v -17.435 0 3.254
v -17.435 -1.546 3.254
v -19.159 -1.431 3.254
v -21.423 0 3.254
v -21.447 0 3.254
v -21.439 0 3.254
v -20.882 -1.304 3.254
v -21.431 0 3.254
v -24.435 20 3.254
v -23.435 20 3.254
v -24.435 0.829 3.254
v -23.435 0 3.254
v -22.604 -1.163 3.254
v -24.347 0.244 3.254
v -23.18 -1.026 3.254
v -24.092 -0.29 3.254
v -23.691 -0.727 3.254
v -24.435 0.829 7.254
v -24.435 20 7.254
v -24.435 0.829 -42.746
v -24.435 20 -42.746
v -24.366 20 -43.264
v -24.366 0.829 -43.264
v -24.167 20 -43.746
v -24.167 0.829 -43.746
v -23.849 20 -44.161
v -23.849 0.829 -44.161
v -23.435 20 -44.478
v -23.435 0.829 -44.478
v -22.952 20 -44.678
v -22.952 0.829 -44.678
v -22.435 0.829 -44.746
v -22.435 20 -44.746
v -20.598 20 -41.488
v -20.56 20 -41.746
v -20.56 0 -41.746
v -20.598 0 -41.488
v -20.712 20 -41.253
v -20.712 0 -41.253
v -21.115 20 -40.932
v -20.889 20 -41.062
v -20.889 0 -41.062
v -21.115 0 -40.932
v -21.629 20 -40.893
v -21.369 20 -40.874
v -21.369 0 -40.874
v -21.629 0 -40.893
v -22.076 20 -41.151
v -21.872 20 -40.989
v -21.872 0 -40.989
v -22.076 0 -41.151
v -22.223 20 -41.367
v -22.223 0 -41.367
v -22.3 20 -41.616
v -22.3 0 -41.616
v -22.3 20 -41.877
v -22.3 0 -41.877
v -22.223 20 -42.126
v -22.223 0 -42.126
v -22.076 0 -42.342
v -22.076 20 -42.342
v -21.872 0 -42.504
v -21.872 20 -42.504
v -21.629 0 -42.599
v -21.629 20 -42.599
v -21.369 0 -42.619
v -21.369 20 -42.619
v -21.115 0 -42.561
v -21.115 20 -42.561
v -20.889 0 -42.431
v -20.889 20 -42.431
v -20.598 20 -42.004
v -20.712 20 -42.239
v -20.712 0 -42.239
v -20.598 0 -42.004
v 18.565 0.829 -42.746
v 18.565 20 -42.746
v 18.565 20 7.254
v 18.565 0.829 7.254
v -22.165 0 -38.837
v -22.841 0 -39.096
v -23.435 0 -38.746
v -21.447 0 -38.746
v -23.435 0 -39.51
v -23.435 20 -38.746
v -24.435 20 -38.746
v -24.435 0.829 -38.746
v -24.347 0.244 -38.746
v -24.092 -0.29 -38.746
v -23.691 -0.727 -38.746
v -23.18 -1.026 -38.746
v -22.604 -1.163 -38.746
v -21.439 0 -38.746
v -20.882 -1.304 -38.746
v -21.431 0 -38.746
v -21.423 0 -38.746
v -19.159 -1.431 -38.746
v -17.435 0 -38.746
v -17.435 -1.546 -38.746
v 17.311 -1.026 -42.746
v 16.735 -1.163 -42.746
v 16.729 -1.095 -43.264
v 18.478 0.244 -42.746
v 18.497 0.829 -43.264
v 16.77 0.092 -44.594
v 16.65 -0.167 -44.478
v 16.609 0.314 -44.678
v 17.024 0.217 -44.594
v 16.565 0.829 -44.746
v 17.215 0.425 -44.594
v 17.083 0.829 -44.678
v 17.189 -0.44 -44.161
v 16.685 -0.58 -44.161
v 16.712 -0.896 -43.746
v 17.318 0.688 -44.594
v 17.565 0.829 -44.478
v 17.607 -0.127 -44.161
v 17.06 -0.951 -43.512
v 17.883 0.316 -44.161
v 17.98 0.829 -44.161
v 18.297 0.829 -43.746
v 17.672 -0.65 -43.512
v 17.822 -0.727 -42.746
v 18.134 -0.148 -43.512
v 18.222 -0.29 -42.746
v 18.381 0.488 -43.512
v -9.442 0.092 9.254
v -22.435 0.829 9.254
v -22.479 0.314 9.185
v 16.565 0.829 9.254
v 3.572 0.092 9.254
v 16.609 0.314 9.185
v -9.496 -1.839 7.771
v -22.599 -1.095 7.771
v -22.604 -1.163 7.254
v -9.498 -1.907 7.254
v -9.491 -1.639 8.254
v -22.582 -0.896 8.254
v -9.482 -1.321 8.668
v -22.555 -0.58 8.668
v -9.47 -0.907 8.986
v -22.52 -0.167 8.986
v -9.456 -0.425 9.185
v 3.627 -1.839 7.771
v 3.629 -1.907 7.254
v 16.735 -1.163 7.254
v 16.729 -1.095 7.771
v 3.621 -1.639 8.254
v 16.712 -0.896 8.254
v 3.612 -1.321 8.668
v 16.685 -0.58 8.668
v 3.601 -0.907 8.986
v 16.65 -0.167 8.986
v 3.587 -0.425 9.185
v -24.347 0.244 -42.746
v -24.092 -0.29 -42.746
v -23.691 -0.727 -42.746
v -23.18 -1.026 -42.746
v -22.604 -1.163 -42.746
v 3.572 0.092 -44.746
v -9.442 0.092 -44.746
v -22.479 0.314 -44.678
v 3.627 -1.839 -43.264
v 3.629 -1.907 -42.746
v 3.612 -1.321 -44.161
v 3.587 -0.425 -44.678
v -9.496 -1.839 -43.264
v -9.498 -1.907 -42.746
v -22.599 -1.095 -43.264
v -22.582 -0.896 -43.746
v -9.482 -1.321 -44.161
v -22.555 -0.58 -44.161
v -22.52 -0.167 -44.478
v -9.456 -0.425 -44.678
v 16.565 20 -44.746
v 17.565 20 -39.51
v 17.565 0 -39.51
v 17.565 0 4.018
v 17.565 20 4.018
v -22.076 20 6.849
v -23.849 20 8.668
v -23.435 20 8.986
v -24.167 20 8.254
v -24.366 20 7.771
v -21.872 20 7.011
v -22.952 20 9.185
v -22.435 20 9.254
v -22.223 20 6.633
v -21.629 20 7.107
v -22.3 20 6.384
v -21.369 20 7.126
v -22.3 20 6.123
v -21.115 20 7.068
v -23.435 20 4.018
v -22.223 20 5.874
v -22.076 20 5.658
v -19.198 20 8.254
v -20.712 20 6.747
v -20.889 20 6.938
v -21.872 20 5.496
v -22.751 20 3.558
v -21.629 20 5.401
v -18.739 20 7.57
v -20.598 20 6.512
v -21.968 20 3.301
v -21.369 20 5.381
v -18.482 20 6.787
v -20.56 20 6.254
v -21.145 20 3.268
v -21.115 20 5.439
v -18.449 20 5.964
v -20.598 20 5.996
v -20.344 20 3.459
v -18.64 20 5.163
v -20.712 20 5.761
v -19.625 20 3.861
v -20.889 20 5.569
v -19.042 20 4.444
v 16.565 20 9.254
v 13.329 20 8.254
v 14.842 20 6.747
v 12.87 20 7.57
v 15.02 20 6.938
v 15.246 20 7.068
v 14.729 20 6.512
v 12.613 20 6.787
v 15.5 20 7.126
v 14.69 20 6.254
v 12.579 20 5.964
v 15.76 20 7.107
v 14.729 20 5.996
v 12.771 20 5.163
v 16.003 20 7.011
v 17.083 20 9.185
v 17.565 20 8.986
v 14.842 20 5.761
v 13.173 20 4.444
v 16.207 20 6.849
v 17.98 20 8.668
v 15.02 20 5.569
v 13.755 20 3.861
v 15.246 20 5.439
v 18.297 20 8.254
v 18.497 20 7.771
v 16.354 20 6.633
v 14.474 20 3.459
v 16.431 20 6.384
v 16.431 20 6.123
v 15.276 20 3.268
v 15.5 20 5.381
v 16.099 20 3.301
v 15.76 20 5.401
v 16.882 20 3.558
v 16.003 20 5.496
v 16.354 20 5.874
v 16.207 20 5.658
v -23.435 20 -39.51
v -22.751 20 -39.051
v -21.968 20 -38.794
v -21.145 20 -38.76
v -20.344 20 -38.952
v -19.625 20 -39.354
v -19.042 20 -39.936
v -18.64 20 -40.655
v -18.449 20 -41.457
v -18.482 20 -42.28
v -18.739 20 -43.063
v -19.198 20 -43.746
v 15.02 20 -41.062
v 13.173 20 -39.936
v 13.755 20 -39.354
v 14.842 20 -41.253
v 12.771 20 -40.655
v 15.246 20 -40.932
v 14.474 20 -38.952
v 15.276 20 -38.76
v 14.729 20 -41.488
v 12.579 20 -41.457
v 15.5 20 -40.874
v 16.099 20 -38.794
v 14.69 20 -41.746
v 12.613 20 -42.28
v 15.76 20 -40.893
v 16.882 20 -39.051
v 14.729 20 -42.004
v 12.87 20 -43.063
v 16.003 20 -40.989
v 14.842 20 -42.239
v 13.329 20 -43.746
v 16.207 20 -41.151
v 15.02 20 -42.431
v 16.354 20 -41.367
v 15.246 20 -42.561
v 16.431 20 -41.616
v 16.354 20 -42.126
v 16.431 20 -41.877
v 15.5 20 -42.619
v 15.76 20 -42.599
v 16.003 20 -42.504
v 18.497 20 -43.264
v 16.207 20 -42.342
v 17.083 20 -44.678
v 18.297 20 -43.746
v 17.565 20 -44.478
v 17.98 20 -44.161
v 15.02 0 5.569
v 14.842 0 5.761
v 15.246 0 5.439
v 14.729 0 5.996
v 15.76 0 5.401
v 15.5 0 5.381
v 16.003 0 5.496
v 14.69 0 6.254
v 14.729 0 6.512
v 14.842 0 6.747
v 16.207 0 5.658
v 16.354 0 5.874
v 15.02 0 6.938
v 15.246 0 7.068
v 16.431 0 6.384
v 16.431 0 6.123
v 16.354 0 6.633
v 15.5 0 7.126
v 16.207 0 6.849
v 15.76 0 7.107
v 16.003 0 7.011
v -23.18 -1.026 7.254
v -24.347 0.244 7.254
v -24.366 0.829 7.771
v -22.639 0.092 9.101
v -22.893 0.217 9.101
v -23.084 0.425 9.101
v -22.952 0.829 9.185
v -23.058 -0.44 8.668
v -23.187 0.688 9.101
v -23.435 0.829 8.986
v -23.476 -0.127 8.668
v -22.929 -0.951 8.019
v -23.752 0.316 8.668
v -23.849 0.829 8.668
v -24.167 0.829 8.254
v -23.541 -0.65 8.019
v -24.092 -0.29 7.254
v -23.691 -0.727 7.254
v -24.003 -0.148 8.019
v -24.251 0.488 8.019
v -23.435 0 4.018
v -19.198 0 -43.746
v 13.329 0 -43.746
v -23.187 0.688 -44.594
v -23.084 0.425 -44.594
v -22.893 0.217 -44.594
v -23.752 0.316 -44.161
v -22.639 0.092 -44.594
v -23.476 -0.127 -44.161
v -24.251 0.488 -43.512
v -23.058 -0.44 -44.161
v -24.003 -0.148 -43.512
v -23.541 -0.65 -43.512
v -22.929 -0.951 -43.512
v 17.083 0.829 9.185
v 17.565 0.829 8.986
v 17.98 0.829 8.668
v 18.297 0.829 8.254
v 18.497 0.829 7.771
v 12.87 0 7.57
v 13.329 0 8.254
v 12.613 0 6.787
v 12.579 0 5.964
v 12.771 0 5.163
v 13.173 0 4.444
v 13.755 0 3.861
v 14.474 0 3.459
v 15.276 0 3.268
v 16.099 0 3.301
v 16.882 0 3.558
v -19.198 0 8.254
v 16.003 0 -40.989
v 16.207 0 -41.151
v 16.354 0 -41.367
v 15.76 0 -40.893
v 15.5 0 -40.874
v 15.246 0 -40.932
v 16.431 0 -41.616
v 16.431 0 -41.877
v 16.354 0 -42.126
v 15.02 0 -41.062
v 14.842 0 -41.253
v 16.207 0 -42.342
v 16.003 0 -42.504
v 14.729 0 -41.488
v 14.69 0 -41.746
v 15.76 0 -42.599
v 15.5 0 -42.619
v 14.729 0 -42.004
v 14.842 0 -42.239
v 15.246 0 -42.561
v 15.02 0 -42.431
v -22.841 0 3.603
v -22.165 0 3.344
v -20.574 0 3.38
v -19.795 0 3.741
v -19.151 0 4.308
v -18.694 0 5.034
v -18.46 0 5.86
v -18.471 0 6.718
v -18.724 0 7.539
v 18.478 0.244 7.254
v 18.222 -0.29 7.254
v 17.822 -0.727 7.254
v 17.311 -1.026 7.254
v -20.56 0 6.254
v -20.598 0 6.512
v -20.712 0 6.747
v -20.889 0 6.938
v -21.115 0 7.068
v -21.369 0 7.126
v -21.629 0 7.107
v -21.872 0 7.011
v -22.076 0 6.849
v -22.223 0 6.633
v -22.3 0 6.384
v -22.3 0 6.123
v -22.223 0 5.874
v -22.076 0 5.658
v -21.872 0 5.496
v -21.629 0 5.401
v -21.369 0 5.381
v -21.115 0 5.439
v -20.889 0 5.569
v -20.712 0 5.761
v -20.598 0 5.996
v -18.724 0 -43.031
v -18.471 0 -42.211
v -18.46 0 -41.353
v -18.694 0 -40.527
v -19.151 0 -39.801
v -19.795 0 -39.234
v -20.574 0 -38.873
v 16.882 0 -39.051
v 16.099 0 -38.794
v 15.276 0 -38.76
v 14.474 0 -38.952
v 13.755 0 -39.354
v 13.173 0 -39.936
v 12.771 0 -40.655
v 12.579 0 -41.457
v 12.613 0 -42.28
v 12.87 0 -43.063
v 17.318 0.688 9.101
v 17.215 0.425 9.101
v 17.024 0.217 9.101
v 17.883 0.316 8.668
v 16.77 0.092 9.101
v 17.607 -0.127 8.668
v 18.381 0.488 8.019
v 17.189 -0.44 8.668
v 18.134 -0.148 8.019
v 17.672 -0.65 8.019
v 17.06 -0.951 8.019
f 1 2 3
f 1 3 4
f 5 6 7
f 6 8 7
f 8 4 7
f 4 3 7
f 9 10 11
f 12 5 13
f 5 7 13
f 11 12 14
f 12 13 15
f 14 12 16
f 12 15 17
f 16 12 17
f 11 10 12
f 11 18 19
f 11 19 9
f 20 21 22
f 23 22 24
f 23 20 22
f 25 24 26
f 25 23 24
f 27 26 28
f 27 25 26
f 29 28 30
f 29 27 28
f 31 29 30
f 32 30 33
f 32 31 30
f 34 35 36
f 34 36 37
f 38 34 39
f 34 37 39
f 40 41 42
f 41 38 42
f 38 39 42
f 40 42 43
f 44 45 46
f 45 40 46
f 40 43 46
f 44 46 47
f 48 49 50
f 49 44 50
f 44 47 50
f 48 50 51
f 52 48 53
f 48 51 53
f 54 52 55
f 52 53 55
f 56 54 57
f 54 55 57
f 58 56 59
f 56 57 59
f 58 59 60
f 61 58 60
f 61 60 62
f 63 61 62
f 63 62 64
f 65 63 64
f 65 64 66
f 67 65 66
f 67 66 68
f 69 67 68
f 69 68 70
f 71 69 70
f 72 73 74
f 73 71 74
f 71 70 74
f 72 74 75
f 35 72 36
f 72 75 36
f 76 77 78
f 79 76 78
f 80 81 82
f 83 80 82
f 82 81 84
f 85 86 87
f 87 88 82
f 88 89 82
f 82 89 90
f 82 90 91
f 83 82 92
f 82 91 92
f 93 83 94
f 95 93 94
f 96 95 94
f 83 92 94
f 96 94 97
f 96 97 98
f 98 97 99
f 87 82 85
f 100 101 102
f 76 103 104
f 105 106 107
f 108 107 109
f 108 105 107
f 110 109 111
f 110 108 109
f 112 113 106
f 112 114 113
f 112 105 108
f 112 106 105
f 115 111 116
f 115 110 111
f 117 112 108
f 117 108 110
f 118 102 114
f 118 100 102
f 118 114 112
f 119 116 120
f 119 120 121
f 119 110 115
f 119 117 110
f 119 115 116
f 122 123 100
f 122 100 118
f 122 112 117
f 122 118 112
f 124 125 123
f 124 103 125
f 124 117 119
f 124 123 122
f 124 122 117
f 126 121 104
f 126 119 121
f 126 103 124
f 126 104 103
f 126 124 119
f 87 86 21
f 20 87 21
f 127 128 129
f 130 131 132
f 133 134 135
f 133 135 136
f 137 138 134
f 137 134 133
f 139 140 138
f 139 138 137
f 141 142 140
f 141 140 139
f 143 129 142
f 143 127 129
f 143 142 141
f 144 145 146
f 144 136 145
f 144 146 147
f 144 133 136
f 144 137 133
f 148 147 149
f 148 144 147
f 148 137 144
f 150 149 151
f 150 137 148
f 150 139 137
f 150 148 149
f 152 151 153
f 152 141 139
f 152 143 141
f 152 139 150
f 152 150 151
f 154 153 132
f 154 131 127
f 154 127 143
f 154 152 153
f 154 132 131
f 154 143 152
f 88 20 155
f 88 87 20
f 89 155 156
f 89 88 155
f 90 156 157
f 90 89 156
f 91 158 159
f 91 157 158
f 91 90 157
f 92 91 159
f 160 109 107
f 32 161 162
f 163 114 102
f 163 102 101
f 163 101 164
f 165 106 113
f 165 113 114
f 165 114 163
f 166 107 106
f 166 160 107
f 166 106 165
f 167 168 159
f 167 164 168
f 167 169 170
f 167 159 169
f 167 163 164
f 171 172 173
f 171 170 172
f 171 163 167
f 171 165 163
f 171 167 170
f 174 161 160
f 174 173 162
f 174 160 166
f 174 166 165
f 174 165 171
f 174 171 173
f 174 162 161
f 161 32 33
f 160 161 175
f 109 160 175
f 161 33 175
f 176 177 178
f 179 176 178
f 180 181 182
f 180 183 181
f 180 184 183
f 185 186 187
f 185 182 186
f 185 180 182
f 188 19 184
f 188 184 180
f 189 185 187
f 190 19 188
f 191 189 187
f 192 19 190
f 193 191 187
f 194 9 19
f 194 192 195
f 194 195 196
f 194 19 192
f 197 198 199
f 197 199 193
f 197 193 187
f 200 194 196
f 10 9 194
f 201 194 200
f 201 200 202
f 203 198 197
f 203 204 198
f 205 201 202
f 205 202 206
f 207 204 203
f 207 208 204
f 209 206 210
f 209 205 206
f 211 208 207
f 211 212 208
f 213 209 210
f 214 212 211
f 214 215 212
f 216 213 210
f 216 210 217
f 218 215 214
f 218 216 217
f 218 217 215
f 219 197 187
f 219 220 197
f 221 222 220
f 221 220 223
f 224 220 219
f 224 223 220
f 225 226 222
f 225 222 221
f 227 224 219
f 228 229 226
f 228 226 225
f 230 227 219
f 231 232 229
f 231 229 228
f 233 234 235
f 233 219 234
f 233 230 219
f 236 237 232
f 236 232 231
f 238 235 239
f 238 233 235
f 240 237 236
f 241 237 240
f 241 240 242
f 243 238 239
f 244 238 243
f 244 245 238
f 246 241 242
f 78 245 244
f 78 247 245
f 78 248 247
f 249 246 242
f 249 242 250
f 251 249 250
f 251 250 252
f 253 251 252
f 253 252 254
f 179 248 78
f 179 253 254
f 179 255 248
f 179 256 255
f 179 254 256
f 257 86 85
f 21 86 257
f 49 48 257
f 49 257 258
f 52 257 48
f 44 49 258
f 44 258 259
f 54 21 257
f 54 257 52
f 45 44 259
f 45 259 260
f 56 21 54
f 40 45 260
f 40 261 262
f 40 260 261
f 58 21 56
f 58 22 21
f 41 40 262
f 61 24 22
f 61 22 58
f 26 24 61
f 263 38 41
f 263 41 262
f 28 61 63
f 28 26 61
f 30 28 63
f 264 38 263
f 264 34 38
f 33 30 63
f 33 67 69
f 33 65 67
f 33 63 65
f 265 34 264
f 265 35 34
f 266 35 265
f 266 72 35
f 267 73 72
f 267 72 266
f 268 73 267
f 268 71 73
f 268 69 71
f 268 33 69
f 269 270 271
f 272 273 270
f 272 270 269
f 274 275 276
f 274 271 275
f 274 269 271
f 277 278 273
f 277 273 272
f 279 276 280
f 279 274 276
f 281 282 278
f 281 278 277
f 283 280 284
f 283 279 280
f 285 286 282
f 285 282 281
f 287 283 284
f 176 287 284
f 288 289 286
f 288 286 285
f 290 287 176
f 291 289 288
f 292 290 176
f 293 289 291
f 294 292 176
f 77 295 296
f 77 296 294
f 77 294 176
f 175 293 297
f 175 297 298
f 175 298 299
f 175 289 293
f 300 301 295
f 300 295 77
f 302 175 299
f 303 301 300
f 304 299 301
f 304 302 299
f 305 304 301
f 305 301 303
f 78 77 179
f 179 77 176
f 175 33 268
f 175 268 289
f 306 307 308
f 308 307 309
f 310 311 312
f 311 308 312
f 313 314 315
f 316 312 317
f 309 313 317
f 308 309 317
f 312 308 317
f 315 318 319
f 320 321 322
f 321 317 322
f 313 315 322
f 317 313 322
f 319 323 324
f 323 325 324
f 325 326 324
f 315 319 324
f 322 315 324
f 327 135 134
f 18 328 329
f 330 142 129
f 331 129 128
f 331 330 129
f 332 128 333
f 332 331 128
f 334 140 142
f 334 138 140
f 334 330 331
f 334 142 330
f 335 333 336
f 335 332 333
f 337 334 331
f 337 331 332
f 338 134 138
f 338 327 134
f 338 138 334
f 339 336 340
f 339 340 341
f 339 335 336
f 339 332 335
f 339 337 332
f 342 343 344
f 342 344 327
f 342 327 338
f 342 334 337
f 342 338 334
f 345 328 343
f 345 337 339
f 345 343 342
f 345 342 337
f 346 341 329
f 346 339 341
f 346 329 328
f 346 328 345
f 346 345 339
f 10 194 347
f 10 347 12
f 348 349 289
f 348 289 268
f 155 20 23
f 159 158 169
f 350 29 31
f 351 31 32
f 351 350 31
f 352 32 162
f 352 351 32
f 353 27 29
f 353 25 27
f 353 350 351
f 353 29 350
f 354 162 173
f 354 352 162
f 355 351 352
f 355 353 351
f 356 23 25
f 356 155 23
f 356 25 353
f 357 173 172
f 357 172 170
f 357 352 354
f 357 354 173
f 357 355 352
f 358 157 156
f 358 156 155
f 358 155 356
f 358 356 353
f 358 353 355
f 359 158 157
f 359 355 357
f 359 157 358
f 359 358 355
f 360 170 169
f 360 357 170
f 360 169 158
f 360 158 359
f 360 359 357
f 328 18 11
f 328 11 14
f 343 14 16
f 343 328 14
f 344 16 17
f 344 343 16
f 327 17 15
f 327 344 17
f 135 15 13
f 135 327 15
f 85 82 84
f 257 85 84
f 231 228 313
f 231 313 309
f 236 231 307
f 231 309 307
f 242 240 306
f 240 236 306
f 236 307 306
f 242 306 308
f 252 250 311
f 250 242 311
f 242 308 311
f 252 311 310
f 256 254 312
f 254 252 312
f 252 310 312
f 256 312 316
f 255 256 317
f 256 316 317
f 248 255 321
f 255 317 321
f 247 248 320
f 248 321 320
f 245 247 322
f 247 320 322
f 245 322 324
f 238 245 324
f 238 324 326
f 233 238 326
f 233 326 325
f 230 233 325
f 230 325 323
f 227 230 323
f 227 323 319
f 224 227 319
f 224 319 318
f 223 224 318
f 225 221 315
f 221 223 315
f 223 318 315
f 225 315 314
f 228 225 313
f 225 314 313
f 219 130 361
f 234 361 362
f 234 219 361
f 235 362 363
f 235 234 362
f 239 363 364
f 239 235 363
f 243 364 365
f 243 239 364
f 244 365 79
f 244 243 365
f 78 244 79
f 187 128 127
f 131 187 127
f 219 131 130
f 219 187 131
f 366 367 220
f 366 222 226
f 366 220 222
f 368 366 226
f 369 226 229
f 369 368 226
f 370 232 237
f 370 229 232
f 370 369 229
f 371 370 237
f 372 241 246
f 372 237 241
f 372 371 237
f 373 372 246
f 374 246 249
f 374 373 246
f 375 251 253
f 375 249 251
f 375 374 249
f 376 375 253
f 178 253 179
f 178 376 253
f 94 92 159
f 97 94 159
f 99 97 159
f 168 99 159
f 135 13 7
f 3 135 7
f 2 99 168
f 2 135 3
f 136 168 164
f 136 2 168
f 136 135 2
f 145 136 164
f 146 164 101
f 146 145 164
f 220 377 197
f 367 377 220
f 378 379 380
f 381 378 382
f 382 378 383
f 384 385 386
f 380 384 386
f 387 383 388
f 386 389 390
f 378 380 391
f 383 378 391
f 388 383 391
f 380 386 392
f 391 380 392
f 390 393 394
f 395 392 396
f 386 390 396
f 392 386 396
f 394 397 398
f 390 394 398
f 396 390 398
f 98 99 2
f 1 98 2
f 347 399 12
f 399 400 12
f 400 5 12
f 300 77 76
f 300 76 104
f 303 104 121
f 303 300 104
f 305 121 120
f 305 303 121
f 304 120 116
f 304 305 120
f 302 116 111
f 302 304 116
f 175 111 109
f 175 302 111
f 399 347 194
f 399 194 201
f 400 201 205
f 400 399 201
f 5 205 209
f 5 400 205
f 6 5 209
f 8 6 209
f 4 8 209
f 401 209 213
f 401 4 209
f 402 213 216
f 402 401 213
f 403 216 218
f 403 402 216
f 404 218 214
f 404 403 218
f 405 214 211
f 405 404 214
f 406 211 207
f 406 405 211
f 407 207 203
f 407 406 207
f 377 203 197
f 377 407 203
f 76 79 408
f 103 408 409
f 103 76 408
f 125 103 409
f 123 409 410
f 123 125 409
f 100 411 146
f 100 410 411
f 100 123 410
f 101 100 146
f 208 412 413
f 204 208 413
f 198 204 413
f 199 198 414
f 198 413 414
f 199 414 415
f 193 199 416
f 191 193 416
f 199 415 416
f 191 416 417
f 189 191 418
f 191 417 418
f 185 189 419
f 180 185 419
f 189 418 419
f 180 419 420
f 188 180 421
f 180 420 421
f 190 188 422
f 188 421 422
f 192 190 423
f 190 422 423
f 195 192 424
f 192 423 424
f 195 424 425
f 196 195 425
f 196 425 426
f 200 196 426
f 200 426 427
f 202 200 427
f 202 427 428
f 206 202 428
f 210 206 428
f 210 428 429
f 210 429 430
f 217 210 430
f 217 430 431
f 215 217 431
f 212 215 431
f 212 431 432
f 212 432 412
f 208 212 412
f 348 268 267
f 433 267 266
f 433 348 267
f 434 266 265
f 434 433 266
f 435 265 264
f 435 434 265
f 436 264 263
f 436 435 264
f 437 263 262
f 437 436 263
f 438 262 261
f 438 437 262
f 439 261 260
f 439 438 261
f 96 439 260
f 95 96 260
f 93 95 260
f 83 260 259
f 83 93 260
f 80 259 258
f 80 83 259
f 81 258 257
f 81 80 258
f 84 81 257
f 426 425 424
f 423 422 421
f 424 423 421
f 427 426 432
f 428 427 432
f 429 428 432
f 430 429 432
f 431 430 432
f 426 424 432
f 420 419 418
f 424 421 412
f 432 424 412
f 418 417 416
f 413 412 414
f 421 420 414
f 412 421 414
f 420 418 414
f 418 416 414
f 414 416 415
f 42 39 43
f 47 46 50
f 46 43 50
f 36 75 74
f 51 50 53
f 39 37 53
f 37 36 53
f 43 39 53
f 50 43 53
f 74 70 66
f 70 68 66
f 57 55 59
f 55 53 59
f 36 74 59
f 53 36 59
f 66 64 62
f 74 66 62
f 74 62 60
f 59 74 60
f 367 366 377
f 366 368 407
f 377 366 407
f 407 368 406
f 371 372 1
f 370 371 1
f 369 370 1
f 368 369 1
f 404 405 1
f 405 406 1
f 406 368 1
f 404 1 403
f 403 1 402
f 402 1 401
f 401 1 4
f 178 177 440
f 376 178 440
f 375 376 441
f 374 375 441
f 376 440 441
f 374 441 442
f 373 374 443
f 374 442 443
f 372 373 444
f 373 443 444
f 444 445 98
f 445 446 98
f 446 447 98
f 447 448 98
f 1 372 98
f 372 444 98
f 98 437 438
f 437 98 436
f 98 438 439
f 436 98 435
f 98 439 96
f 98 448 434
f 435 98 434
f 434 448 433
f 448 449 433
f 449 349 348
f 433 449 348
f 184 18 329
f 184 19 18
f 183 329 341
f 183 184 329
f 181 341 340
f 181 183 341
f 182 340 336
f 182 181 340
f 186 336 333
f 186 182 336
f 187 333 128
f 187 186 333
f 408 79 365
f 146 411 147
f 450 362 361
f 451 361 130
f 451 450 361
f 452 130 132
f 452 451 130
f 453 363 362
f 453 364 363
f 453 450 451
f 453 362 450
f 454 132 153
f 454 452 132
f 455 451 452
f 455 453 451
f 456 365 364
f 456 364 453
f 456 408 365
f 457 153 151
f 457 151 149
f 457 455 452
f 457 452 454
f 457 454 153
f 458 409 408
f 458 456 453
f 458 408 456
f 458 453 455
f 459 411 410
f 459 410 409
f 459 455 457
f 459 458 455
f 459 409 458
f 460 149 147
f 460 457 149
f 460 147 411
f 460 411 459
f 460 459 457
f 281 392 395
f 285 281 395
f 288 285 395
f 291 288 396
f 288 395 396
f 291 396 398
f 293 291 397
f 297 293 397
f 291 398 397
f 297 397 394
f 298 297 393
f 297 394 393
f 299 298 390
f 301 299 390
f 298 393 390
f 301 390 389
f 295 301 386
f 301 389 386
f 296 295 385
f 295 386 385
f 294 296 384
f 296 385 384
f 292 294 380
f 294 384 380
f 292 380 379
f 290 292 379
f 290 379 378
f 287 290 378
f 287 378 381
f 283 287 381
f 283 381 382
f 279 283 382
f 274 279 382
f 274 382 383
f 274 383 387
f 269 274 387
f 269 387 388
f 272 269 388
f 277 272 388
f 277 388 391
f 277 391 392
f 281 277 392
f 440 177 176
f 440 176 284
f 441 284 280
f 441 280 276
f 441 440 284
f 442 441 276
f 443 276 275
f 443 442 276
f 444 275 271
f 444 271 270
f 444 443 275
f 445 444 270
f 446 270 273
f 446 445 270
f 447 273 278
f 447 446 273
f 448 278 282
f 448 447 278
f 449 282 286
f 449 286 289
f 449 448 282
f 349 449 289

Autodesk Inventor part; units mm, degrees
ref_plane "YZ Plane" through (0, 0, 0) normal (1, 0, 0) x (0, 1, 0)
ref_plane "XZ Plane" through (0, 0, 0) normal (0, 1, 0) x (-1, 0, 0)
ref_plane "XY Plane" through (0, 0, 0) normal (0, 0, 1) x (1, 0, 0)
sketch "Sketch1" plane through (0, 0, 0) normal (0, 1, 0) x (-1, 0, 0)
  line L0 (-18.5654, 9.2536) -> (2.9346, 9.2536)
  line L1 (2.9346, 9.2536) -> (2.9346, -17.7464)
  line L2 (2.9346, -17.7464) -> (-18.5654, -17.7464)
  line L3 (-18.5654, -17.7464) -> (-18.5654, 9.2536)
  circle A0 centre (-15.5654, 6.2536) radius 0.875
  line L4 (-17.5654, 3.454) -> (-17.5654, -16.6136)
  line L5 (2.9346, 8.2536) -> (-13.3293, 8.2536)
  line L6 (-17.5654, 3.454) -> (-17.5654, 4.0175)
  line L7 (-17.5654, -16.6136) -> (-17.5654, -17.7464)
  arc A1 (-17.5654, 4.0175) -> (-13.3293, 8.2536) centre (-15.5654, 6.2536) ccw
  point P0 (0, 0)
  dimension "d0" = 21.5
  dimension "d2" = 27
  dimension "d3" = 3
  dimension "d4" = 3
  dimension "d6" = 1.75
  dimension "d7" = 1
  dimension "d8" = 1
extrude "Extrusion1" add sketch "Sketch1" along normal blind 20 contours L0 L1 L5 A1 L6 L4 L7 L2 L3
sketch "Sketch2" plane through (0, 0, 0) normal (0, -1, 0) x (1, 0, 0)
  line L0 (18.5654, 9.2536) -> (-2.9346, 9.2536)
  line L1 (-2.9346, 9.2536) -> (-2.9346, -17.7464)
  line L2 (-2.9346, -17.7464) -> (18.5654, -17.7464)
  line L3 (18.5654, -17.7464) -> (18.5654, 9.2536)
  point P0 (0, 0)
extrude "Extrusion2" add sketch "Sketch2" along normal blind 1
mirror "Mirror1" about plane through (18.5654, 0, -17.7464) normal (0, 0, -1) of "Extrusion1", "Extrusion2"
mirror "Mirror2" about plane through (-2.9346, 0, 8.2536) normal (-1, 0, 0) of "Extrusion1", "Extrusion2", "Mirror1"
sketch "Sketch3" plane through (18.5654, -1, 9.2536) normal (0, 0, 1) x (1, 0, 0)
  line L0 (0, 0) -> (-43, 0) projected
  arc A0 (-43, 0) -> (0, 0) centre (-21.5, 230.625) ccw
  line L1 (-40.8006, -1) -> (-1.6118, -1)
  point P0 (-18.5654, 1)
  dimension "d13" = 1
extrude "Extrusion3" add sketch "Sketch3" against normal blind 54
fillet "Fillet1" radius 2 8 edges at (-24.4346, -1, -17.7464) (-2.9346, -2, -44.7464) (-24.4346, 9.5, -44.7464) (18.5654, 9.5, -44.7464) (-24.4346, 9.5, 9.2536) (-2.9346, -2, 9.2536) (18.5654, 9.5, 9.2536) (18.5654, -1, -17.7464)
sketch "Sketch4" plane through (0, 0, 0) normal (0, 1, 0) x (1, 0, 0)
  line L0 (-38.0807, 38.7464) -> (-17.4346, 38.7464)
  line L1 (-17.4346, 38.7464) -> (-17.4346, -3.2536)
  line L2 (-17.4346, -3.2536) -> (-38.0807, -3.2536)
  line L3 (-38.0807, -3.2536) -> (-38.0807, 38.7464)
  line L4 (-24.4346, 42.7464) -> (-24.4346, -7.2536) projected
  arc A0 (-23.4346, 39.5104) -> (-19.1985, 43.7464) centre (-21.4346, 41.7464) ccw projected
  arc A1 (-19.1985, -8.2536) -> (-23.4346, -4.0175) centre (-21.4346, -6.2536) ccw projected
  point P0 (0, 0)
  dimension "d17" = 7
extrude "Extrusion4" cut sketch "Sketch4" along normal mid plane 50
properties part number "cuerpo"
